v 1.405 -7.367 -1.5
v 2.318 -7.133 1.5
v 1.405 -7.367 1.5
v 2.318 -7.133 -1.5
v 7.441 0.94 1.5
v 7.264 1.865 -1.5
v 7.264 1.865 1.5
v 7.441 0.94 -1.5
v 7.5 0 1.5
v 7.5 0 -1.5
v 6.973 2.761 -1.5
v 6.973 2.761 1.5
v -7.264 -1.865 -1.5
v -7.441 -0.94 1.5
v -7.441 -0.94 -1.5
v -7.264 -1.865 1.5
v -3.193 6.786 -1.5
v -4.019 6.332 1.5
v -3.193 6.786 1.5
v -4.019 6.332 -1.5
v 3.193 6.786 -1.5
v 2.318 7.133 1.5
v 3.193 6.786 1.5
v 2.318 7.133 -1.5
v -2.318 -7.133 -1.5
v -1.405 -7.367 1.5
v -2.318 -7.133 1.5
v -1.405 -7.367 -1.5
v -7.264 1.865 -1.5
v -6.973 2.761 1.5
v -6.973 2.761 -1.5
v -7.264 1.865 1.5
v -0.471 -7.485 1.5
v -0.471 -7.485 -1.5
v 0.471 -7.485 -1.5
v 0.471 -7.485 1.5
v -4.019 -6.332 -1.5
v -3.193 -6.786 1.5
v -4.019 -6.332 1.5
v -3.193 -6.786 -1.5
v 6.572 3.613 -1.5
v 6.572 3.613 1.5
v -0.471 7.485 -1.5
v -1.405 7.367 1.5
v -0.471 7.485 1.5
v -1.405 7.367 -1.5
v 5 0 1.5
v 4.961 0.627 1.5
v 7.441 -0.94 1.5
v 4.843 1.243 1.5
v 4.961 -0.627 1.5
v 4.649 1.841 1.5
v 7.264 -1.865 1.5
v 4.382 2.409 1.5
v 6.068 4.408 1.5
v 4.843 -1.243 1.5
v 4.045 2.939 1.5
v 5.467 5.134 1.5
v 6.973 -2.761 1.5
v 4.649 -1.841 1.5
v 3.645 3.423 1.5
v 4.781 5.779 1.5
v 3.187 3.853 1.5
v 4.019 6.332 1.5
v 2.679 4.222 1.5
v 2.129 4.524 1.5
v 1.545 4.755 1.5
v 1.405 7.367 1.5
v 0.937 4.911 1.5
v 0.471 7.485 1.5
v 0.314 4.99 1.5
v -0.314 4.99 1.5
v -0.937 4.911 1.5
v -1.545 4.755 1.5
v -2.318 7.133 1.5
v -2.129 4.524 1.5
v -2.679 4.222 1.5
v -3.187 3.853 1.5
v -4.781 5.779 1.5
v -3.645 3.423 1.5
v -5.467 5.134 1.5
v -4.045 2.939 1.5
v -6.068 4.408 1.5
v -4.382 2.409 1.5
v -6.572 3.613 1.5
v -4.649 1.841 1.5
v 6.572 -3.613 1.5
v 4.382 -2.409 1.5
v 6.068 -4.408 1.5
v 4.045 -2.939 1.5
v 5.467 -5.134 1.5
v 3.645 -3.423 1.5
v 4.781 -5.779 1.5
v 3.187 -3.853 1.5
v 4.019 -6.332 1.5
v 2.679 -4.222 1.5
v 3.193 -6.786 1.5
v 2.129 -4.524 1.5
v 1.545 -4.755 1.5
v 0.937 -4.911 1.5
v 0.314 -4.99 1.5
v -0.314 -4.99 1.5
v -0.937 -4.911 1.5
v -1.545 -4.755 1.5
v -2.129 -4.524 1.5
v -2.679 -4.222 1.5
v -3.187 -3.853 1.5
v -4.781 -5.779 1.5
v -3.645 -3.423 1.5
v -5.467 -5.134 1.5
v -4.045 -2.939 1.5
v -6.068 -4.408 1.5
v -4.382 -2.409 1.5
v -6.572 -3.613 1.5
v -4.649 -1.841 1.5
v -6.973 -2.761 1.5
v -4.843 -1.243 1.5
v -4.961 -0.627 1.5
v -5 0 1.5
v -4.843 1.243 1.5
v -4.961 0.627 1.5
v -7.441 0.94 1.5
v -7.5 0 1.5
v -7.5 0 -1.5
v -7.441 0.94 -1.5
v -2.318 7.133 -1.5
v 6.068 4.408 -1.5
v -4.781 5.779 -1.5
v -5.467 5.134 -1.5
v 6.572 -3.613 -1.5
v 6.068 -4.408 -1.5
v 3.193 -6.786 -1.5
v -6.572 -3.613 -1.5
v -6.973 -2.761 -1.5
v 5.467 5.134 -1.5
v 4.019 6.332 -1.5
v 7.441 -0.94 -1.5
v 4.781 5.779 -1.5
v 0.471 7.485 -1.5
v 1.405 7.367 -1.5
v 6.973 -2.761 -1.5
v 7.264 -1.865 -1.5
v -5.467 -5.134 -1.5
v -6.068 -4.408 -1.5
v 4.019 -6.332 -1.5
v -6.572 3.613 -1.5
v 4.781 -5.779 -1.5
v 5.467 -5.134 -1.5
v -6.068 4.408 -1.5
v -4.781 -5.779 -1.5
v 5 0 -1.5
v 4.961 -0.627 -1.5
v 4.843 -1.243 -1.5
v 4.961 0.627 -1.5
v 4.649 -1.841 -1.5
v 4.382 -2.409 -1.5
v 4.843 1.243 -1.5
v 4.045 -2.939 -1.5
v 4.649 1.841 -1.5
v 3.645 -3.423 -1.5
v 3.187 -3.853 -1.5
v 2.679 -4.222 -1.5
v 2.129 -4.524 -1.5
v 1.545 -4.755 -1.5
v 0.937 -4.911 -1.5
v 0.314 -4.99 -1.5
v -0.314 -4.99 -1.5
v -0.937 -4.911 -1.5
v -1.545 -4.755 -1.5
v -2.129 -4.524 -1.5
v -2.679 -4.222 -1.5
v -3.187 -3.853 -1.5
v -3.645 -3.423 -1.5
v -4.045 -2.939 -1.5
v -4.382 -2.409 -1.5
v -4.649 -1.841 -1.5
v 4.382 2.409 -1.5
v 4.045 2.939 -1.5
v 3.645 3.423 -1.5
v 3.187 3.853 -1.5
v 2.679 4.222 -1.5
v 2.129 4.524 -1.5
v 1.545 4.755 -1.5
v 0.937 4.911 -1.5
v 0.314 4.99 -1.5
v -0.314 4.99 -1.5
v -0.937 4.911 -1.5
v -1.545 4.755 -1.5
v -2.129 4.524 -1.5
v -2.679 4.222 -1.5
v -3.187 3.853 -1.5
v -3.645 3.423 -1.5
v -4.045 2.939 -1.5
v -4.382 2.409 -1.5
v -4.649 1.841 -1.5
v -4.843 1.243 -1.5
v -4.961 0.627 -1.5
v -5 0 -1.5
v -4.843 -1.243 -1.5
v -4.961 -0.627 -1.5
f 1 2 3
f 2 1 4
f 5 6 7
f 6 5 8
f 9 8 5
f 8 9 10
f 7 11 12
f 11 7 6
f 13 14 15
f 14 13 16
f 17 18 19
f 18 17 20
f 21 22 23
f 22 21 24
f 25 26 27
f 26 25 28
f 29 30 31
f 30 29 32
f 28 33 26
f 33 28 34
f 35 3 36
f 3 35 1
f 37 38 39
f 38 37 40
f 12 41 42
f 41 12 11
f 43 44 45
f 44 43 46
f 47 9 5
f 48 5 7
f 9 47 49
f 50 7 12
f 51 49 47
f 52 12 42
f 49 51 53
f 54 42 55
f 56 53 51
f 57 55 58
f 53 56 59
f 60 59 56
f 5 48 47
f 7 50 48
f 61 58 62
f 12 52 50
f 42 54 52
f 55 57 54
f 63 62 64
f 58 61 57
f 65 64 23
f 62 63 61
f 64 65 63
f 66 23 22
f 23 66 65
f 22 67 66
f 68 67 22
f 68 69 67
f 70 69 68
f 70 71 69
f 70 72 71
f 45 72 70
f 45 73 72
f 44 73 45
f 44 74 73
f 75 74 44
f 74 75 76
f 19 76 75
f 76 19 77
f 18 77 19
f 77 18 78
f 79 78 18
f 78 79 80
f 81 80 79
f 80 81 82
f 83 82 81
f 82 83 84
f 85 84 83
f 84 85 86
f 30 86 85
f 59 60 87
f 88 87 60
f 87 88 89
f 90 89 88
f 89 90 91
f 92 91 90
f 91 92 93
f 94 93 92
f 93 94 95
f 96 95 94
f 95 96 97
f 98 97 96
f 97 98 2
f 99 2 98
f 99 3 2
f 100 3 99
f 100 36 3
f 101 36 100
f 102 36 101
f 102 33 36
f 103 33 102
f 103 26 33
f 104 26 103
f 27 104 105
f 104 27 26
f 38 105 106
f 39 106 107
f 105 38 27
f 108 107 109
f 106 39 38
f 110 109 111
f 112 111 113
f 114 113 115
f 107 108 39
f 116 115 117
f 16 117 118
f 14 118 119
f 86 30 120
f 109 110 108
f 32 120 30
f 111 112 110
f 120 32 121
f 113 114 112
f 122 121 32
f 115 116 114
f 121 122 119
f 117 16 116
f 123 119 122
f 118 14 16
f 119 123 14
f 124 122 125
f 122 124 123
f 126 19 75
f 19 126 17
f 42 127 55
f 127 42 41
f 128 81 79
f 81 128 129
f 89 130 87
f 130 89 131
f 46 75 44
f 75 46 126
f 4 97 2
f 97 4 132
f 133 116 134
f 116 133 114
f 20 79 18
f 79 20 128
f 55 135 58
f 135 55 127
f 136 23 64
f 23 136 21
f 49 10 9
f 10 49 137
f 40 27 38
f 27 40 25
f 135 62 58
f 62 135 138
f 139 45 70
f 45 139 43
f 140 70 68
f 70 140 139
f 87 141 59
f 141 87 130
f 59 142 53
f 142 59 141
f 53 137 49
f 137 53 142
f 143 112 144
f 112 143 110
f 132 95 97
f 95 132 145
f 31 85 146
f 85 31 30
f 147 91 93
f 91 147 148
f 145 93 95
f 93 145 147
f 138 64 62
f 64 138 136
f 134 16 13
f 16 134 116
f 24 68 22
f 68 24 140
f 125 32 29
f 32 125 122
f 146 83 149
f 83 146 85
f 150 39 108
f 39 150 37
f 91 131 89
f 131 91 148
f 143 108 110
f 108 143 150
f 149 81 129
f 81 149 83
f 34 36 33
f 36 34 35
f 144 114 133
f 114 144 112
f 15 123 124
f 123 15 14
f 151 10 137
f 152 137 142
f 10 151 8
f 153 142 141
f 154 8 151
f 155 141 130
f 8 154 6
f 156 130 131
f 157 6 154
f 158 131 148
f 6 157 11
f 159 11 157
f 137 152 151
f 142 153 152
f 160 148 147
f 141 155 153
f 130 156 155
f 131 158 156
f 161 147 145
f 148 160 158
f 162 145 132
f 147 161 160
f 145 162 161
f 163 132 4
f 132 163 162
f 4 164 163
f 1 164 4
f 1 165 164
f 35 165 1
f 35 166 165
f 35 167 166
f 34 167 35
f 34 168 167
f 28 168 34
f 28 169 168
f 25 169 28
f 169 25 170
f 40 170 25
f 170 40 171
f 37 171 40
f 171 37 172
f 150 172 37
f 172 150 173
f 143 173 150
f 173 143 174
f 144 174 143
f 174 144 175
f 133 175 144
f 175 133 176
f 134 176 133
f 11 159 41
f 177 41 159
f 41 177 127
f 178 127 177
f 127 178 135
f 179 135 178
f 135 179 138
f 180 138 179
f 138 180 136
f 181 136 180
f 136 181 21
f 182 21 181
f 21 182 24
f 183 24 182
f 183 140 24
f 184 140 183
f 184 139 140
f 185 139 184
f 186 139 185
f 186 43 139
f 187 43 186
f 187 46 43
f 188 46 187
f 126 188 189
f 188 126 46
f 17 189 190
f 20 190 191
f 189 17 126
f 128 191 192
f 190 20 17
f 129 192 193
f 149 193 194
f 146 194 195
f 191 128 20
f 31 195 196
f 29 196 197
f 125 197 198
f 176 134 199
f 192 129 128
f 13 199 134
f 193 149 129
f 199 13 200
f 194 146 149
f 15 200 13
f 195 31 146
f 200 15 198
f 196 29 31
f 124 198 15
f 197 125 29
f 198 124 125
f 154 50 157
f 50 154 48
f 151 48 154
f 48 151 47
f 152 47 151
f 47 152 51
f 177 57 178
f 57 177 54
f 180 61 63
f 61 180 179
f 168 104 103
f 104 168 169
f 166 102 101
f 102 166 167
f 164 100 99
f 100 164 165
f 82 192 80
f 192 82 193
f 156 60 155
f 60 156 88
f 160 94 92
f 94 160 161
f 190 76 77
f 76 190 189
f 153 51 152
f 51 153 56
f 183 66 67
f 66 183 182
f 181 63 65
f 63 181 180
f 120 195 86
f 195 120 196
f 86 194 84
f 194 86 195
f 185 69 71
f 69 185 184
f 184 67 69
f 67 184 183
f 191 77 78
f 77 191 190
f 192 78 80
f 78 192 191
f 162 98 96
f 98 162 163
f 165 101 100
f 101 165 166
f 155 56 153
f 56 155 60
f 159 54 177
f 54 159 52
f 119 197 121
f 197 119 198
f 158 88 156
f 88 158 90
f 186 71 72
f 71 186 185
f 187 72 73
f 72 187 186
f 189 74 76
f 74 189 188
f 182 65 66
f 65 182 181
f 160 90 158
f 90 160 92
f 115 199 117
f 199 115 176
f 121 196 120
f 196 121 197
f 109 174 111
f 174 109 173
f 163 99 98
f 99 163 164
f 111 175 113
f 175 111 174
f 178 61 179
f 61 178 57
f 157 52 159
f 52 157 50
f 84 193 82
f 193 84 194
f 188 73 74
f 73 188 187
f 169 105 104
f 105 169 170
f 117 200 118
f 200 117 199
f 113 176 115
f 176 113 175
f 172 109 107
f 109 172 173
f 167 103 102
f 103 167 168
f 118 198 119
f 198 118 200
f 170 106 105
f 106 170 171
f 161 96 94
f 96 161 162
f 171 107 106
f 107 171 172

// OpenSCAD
$fn = 50;


difference() {
	union() {
		translate(v = [0, 0, -1.5000000000]) {
			cylinder(h = 3, r = 7.5000000000);
		}
	}
	union() {
		translate(v = [0, 0, -100.0000000000]) {
			cylinder(h = 200, r = 5.0000000000);
		}
	}
}
